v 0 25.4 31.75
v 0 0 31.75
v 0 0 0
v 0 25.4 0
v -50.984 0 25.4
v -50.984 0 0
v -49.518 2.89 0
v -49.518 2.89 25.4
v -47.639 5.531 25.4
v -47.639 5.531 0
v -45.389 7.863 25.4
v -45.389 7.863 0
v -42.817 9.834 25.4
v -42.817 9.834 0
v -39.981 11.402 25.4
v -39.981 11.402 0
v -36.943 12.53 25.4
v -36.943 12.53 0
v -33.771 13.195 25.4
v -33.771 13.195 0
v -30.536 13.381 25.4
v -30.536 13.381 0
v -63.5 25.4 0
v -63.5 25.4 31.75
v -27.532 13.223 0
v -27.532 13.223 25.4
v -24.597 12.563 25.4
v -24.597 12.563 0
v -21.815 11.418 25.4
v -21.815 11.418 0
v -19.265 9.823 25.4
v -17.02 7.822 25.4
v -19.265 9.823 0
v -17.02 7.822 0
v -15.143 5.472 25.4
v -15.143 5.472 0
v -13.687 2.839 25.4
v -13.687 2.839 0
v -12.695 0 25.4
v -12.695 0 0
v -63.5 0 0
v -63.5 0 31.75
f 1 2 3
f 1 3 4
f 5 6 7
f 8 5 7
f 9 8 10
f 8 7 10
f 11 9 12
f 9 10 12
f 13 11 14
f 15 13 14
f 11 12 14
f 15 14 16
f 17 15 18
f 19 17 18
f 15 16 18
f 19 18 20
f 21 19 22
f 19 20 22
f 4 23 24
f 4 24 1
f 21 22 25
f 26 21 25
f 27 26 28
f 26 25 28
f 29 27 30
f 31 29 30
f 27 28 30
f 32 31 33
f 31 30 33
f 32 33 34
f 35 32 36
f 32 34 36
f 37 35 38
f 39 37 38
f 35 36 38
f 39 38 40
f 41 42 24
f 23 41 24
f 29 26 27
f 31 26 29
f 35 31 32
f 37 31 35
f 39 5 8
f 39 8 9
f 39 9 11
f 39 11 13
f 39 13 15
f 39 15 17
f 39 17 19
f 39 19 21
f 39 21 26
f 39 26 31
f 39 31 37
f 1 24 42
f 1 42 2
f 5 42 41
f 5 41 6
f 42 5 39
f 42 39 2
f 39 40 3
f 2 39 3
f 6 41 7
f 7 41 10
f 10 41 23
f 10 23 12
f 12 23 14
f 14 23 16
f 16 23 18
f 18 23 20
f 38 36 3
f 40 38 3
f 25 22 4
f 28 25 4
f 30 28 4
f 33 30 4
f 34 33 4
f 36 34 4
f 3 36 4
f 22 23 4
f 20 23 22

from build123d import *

# Parameters (mm, degrees)
F0_W     = 63.5
F0_H     = 25.4
F1_DEPTH = 31.75
F3_DEPTH = 25.4


with BuildPart() as f1:
    # F0 (on Top) → F1 (new body)
    with BuildSketch(Plane.XY):
        with Locations((-31.75, 12.7)):
            Rectangle(F0_W, F0_H)
    extrude(amount=F1_DEPTH)

    # F2 (on face) → F3 (cut)
    with BuildSketch(Plane(origin=(0, 0, 0), x_dir=(1, 0, 0), z_dir=(0, 0, -1))):
        with BuildLine():
            ThreePointArc((-50.984073, 0), (-42.817071, -9.834289), (-30.535549, -13.380745))
            ThreePointArc((-30.535549, -13.380745), (-19.265496, -9.823114), (-12.694554, 0))
            Line((-12.694554, 0), (-50.984073, 0))
        make_face()
    extrude(amount=-F3_DEPTH, mode=Mode.SUBTRACT)


solid = f1.part
